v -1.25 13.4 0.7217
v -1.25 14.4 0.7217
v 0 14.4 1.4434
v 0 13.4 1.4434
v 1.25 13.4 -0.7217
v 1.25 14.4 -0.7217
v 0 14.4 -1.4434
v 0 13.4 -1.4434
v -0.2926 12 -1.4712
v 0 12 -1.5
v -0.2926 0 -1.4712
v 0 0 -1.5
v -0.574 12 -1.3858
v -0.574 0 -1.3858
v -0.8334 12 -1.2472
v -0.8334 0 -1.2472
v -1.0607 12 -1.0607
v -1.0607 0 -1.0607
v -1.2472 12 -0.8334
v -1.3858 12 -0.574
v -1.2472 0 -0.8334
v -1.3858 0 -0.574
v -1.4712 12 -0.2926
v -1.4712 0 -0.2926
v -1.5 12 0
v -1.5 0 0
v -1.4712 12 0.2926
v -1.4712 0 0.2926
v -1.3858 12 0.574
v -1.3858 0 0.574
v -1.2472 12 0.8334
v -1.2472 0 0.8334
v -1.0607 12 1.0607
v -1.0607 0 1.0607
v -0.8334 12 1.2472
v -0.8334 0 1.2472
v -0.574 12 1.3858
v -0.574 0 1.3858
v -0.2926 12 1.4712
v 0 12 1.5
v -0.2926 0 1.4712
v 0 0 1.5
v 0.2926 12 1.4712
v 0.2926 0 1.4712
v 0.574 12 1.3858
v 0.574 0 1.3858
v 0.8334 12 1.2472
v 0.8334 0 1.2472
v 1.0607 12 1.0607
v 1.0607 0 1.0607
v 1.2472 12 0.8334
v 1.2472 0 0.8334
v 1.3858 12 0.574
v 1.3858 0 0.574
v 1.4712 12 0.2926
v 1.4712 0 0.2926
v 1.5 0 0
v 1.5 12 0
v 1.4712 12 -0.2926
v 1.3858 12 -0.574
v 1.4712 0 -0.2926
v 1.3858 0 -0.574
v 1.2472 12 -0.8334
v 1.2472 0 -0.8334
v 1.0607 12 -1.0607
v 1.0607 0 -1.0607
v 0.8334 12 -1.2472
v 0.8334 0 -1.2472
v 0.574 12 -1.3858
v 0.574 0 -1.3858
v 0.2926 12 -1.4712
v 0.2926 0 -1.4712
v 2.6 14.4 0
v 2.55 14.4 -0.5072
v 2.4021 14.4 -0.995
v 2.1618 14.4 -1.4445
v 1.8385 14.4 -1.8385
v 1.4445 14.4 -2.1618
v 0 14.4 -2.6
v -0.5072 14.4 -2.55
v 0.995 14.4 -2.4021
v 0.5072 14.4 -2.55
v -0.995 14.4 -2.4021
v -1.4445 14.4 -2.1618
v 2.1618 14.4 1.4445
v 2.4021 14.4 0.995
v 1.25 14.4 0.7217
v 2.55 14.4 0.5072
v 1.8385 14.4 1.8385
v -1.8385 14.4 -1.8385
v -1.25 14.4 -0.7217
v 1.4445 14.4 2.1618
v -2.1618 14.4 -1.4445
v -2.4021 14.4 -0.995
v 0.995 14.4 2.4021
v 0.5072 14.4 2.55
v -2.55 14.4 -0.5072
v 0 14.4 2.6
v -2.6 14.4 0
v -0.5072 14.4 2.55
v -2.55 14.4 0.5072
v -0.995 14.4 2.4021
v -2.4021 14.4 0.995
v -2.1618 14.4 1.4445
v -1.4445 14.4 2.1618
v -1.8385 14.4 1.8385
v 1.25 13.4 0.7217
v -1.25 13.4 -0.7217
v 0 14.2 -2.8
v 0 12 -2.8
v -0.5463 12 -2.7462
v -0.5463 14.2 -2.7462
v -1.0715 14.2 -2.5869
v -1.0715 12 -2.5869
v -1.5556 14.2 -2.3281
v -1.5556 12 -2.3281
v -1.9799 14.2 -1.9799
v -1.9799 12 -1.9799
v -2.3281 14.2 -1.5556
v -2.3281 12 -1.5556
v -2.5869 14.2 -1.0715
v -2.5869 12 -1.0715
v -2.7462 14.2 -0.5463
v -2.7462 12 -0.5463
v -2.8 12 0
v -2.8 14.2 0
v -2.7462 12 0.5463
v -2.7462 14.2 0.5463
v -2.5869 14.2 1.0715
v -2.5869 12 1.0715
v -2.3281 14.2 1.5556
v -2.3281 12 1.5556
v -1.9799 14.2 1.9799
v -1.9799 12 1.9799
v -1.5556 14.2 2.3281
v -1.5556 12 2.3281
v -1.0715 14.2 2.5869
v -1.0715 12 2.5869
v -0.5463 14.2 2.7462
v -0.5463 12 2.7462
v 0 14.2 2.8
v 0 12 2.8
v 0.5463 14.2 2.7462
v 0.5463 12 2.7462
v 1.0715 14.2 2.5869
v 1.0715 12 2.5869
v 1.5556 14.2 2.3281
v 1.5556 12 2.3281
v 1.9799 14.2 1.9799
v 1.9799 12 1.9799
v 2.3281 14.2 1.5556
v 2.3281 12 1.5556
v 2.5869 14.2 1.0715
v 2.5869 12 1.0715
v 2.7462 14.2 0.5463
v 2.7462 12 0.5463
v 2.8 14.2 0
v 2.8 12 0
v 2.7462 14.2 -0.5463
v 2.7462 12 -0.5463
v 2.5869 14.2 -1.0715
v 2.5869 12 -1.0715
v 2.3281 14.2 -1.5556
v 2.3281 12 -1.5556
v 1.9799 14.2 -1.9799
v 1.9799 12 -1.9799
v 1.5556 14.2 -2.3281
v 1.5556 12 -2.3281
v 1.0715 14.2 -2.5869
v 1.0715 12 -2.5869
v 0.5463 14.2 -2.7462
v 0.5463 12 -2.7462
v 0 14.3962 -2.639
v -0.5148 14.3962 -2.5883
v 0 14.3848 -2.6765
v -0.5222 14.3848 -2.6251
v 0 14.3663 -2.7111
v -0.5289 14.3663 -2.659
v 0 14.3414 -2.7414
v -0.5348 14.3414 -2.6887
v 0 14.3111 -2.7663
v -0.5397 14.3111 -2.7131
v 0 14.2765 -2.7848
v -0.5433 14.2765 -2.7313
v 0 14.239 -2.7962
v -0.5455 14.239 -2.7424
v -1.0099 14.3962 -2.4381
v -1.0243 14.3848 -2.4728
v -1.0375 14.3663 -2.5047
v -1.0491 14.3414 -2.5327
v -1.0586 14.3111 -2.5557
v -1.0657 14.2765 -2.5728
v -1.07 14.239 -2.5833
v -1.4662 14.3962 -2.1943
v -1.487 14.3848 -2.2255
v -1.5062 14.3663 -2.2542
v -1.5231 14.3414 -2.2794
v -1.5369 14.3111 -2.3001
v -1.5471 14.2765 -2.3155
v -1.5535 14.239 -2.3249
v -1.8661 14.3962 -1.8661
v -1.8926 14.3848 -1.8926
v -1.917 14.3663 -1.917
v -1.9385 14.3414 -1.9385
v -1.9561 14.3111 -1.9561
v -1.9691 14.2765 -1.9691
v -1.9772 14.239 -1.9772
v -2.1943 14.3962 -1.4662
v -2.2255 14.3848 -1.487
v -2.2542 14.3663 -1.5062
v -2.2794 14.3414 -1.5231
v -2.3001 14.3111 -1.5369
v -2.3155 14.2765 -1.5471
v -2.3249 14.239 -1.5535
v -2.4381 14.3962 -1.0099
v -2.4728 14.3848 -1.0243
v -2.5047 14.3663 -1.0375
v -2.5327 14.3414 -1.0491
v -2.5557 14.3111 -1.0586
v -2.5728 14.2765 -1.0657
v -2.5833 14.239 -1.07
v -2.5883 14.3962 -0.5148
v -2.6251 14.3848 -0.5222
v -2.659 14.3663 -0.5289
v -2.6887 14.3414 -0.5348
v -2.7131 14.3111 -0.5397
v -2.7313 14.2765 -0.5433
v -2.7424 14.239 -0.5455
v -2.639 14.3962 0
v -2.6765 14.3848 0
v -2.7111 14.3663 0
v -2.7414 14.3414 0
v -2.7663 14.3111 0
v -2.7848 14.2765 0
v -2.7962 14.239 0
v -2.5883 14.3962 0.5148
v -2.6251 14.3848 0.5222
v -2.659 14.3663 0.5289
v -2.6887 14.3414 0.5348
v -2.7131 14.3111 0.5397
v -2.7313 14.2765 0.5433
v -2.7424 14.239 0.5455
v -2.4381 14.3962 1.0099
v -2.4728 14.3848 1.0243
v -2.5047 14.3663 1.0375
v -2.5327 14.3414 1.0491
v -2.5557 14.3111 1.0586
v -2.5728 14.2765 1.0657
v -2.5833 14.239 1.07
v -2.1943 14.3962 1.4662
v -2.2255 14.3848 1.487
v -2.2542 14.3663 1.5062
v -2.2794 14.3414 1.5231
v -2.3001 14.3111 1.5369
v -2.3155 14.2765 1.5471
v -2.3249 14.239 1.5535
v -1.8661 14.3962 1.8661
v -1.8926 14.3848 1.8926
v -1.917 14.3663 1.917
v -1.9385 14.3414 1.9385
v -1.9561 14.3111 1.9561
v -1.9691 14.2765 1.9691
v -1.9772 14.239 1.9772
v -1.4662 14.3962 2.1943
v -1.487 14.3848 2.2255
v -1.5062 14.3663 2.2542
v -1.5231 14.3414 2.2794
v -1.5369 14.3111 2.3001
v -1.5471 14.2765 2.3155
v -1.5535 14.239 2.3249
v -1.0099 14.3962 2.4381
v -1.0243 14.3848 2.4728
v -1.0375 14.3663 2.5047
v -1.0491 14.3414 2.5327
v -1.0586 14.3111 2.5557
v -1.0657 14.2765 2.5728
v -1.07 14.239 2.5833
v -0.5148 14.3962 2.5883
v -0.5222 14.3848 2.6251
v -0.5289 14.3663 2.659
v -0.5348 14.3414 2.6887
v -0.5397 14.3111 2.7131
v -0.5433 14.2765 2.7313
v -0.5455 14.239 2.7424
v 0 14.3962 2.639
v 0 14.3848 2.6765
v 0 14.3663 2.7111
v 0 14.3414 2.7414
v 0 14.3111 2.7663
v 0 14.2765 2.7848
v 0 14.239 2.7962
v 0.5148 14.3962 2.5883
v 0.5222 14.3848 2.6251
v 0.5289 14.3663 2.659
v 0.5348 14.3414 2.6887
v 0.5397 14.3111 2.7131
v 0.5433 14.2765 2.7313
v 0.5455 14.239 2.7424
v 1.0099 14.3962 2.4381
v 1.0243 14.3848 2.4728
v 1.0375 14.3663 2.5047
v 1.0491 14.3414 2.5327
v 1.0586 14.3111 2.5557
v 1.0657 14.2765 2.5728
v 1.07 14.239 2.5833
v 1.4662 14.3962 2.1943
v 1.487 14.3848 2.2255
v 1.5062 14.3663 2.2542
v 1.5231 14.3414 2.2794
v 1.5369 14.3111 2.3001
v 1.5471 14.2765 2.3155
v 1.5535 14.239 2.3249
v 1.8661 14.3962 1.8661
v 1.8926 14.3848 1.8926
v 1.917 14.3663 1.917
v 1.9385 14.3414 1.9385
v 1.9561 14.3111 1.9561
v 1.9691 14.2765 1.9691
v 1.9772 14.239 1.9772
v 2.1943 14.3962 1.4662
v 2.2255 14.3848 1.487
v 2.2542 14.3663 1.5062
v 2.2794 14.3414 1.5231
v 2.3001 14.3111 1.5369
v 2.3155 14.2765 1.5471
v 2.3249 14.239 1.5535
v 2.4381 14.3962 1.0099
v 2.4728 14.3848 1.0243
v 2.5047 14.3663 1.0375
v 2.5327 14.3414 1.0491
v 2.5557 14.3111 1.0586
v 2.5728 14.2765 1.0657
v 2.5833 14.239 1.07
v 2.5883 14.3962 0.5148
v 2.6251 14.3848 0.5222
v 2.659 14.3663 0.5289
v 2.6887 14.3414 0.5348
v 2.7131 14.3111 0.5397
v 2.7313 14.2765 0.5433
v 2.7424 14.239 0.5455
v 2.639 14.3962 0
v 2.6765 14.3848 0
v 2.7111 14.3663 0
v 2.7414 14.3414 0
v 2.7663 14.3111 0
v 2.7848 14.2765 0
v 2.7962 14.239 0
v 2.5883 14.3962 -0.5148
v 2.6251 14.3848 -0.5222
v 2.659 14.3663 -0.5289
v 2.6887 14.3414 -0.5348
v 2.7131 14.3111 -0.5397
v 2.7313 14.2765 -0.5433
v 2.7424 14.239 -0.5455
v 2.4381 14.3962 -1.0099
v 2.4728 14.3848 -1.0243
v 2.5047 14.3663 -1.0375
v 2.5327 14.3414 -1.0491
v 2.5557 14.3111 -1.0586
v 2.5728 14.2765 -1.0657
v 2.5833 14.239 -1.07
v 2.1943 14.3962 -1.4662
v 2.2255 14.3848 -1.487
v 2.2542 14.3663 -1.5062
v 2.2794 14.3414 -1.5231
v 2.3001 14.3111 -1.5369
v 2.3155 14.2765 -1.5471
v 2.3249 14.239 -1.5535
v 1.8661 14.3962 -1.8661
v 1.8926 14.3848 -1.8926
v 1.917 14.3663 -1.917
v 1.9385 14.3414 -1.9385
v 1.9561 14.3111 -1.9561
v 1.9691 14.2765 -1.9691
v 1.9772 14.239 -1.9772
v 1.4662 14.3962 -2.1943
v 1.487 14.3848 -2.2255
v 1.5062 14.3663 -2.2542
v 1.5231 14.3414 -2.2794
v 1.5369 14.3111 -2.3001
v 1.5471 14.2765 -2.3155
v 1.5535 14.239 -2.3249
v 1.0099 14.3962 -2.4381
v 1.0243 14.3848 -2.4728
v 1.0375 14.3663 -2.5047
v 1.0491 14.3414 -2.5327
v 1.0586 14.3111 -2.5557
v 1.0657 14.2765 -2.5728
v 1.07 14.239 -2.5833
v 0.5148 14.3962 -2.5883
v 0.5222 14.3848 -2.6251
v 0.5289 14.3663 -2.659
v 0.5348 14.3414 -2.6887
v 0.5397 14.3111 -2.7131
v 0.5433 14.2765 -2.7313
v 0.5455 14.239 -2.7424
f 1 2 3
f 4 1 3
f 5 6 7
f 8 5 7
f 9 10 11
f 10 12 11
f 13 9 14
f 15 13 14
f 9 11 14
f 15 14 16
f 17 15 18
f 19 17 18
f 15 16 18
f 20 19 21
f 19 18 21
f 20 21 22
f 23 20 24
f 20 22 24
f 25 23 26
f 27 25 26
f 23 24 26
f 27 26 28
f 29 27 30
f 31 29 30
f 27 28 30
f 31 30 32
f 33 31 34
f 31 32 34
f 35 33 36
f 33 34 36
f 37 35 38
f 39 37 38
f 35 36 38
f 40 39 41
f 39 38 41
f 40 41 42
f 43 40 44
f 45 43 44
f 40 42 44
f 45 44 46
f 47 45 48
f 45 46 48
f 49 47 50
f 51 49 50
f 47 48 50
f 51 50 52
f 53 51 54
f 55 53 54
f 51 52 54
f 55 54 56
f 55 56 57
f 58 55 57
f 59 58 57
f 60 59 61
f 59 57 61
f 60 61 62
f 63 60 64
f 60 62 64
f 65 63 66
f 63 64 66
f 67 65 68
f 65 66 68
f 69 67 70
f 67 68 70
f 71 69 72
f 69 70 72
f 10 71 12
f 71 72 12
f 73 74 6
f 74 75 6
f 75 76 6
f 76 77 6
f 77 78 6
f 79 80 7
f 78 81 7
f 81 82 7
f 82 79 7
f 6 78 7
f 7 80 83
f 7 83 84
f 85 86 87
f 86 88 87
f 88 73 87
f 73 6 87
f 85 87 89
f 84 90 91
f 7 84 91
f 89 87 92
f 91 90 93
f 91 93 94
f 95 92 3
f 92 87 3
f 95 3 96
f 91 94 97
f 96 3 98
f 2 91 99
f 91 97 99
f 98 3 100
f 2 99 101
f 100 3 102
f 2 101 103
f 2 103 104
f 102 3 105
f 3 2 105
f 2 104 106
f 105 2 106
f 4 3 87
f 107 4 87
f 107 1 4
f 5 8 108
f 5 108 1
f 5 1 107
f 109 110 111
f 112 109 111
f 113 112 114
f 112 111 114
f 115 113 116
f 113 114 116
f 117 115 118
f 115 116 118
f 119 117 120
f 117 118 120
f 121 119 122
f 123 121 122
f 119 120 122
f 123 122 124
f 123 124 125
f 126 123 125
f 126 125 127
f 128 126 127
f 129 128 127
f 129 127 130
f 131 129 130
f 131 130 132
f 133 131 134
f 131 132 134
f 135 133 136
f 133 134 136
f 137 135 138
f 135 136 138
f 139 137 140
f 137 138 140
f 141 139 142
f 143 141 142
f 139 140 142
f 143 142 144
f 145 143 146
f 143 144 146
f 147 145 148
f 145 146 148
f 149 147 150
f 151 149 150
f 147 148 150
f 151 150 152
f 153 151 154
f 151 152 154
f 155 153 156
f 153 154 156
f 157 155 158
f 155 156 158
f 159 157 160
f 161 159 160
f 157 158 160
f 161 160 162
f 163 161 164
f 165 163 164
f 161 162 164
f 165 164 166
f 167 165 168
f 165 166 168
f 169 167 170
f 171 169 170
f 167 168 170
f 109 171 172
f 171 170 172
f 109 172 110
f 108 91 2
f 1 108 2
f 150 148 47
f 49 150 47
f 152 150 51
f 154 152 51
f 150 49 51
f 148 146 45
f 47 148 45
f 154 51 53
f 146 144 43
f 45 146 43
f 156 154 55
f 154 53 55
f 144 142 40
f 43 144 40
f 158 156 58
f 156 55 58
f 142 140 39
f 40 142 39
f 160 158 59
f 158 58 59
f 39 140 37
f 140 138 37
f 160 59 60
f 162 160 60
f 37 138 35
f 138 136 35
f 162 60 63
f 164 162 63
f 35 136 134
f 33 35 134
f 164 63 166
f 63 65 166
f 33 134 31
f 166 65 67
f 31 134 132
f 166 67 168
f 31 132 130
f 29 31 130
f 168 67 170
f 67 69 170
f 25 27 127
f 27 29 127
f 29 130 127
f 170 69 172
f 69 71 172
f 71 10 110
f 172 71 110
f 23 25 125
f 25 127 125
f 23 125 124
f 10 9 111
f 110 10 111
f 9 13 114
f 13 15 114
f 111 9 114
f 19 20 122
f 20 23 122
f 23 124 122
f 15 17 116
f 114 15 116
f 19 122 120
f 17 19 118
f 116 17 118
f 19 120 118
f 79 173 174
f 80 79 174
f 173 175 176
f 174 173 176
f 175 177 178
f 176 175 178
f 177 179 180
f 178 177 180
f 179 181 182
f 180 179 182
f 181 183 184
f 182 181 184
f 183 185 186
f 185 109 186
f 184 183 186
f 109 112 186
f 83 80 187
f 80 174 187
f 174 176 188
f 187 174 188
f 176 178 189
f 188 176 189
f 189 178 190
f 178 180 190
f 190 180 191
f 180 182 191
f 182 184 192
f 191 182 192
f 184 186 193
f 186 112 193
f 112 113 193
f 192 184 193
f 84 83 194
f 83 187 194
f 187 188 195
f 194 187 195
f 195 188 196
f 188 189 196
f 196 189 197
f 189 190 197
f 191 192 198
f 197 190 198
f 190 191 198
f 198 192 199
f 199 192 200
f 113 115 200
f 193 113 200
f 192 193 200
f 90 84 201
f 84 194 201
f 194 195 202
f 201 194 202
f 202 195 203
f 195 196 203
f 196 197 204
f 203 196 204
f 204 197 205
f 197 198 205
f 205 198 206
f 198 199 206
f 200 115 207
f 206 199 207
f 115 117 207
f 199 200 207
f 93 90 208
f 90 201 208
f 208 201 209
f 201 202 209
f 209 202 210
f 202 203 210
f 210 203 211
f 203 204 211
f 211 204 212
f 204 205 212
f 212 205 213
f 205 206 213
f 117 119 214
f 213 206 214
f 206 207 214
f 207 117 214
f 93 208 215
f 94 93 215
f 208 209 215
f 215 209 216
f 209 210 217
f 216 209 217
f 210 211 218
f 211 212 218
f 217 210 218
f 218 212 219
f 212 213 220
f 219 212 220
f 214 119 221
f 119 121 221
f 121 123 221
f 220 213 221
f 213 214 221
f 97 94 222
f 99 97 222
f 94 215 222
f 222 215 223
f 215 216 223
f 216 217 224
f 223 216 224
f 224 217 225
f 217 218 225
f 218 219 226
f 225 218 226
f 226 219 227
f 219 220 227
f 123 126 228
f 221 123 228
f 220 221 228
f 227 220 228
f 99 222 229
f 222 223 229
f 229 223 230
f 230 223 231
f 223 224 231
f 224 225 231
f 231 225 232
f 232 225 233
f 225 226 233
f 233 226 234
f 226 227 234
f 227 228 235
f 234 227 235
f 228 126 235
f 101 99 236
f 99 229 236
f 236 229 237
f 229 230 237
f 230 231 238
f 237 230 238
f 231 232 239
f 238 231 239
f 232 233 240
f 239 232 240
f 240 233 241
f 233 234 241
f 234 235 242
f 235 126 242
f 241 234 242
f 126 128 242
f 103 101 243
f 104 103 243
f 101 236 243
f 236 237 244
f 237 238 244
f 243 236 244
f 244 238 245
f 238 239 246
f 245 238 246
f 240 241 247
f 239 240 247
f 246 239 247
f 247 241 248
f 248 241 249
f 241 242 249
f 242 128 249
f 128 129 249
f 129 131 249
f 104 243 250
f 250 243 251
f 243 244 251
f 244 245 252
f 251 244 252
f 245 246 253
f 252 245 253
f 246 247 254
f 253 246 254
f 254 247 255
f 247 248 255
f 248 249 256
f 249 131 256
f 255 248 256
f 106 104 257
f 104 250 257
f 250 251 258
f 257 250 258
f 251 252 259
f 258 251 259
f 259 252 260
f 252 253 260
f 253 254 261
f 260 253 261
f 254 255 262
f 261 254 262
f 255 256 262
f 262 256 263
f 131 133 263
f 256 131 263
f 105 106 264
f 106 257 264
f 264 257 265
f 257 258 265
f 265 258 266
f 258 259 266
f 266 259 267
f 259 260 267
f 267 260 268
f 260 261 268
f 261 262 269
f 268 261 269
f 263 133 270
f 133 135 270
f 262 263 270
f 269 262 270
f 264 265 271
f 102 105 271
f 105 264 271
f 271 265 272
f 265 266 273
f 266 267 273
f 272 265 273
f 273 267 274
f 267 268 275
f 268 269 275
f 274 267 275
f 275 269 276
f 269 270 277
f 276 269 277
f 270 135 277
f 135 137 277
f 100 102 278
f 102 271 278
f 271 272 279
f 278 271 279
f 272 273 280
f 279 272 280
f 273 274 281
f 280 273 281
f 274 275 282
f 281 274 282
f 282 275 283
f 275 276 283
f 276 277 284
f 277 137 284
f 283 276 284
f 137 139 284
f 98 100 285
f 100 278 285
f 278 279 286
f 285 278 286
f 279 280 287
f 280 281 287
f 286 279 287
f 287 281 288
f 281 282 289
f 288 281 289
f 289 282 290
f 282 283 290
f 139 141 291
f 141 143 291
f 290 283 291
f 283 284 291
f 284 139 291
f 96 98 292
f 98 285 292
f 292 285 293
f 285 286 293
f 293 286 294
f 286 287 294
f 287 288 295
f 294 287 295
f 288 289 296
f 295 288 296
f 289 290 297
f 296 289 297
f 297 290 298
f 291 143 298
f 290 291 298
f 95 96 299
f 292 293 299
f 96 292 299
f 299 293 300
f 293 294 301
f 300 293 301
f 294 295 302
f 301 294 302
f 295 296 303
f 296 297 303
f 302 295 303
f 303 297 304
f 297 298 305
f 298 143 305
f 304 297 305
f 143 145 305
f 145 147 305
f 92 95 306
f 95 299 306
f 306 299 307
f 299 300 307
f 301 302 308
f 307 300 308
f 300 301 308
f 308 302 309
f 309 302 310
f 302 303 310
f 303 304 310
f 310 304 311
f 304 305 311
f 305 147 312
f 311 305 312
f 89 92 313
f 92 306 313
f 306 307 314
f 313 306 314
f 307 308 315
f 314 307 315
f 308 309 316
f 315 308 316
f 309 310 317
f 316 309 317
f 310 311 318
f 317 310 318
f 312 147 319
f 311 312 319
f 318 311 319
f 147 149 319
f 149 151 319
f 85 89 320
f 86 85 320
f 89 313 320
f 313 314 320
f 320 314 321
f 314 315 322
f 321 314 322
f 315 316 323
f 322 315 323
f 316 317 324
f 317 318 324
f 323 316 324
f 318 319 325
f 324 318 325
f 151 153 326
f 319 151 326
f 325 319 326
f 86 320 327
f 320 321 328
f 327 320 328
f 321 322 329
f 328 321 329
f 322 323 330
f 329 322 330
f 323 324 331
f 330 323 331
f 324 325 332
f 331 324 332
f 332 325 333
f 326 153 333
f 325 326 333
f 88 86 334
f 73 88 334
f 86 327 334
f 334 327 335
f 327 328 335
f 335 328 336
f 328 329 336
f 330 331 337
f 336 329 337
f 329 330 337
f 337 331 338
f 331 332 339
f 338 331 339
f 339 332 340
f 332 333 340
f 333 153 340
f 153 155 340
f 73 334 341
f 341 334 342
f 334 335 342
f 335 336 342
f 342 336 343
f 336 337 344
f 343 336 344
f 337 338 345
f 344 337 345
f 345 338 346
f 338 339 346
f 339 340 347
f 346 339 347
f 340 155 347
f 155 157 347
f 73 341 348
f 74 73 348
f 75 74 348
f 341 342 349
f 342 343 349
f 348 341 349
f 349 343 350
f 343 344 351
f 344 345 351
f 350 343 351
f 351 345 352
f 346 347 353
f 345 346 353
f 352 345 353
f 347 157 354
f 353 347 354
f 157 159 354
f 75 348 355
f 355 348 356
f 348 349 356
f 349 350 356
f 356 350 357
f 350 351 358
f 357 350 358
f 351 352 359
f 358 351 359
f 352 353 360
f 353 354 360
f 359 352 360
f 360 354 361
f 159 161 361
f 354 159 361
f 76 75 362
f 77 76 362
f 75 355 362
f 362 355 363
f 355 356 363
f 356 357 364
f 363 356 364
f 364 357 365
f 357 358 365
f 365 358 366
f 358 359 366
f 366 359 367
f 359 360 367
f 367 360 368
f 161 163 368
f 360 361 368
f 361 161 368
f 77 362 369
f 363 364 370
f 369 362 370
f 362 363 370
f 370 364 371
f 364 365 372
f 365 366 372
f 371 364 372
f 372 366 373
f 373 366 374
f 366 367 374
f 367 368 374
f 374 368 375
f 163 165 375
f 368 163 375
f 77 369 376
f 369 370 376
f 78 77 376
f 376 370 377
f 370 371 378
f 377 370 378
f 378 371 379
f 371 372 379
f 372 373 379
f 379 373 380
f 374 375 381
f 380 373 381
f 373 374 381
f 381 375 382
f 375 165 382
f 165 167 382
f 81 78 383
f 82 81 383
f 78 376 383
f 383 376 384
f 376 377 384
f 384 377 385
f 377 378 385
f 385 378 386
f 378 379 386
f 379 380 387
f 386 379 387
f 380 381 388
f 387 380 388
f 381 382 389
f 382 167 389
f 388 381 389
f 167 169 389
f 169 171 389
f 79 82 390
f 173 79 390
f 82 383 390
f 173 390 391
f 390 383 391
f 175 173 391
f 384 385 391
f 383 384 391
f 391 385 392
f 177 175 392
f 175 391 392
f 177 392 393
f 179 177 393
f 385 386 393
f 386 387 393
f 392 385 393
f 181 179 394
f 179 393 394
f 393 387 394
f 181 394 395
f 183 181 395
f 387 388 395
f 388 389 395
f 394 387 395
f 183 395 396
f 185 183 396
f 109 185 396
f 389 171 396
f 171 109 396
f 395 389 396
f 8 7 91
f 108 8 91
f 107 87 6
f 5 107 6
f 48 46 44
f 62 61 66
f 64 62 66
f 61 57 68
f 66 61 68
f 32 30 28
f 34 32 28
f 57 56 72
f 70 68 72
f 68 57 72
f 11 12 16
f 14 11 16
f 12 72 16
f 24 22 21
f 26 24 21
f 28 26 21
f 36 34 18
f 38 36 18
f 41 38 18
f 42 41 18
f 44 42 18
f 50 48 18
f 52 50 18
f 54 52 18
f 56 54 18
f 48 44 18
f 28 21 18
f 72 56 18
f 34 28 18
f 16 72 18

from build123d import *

# Parameters (mm, degrees)
CUT_EXTRUDE1_DEPTH = 1
FILLET1_R          = 0.2


with BuildPart() as part:
    # Sketch1 → Revolve1 (revolve)
    with BuildSketch(Plane.XY, mode=Mode.PRIVATE) as revolve1_sk:
        Polygon((0, 0), (0, 14.4), (2.8, 14.4), (2.8, 12), (1.5, 12), (1.5, 0), align=None)
    revolve(revolve1_sk.sketch.rotate(Axis((0, 0, 0), (0, 1, 0)), 90), axis=Axis((0, 0, 0), (0, 1, 0)))

    # Sketch2 → Cut-Extrude1 (cut)
    with BuildSketch(Plane(origin=(0, 14.4, 0), x_dir=(1, 0, 0), z_dir=(0, 1, 0))):
        Polygon((0, -1.443375673), (1.25, -0.721687836), (1.25, 0.721687836), (0, 1.443375673), (-1.25, 0.721687836), (-1.25, -0.721687836), align=None)
    extrude(amount=-CUT_EXTRUDE1_DEPTH, mode=Mode.SUBTRACT)

    # Fillet1
    fillet1_edges = [part.edges().sort_by_distance(p)[0] for p in [
        (0, 14.4, 2.8),
    ]]
    fillet(fillet1_edges, radius=FILLET1_R)


solid = part.part
